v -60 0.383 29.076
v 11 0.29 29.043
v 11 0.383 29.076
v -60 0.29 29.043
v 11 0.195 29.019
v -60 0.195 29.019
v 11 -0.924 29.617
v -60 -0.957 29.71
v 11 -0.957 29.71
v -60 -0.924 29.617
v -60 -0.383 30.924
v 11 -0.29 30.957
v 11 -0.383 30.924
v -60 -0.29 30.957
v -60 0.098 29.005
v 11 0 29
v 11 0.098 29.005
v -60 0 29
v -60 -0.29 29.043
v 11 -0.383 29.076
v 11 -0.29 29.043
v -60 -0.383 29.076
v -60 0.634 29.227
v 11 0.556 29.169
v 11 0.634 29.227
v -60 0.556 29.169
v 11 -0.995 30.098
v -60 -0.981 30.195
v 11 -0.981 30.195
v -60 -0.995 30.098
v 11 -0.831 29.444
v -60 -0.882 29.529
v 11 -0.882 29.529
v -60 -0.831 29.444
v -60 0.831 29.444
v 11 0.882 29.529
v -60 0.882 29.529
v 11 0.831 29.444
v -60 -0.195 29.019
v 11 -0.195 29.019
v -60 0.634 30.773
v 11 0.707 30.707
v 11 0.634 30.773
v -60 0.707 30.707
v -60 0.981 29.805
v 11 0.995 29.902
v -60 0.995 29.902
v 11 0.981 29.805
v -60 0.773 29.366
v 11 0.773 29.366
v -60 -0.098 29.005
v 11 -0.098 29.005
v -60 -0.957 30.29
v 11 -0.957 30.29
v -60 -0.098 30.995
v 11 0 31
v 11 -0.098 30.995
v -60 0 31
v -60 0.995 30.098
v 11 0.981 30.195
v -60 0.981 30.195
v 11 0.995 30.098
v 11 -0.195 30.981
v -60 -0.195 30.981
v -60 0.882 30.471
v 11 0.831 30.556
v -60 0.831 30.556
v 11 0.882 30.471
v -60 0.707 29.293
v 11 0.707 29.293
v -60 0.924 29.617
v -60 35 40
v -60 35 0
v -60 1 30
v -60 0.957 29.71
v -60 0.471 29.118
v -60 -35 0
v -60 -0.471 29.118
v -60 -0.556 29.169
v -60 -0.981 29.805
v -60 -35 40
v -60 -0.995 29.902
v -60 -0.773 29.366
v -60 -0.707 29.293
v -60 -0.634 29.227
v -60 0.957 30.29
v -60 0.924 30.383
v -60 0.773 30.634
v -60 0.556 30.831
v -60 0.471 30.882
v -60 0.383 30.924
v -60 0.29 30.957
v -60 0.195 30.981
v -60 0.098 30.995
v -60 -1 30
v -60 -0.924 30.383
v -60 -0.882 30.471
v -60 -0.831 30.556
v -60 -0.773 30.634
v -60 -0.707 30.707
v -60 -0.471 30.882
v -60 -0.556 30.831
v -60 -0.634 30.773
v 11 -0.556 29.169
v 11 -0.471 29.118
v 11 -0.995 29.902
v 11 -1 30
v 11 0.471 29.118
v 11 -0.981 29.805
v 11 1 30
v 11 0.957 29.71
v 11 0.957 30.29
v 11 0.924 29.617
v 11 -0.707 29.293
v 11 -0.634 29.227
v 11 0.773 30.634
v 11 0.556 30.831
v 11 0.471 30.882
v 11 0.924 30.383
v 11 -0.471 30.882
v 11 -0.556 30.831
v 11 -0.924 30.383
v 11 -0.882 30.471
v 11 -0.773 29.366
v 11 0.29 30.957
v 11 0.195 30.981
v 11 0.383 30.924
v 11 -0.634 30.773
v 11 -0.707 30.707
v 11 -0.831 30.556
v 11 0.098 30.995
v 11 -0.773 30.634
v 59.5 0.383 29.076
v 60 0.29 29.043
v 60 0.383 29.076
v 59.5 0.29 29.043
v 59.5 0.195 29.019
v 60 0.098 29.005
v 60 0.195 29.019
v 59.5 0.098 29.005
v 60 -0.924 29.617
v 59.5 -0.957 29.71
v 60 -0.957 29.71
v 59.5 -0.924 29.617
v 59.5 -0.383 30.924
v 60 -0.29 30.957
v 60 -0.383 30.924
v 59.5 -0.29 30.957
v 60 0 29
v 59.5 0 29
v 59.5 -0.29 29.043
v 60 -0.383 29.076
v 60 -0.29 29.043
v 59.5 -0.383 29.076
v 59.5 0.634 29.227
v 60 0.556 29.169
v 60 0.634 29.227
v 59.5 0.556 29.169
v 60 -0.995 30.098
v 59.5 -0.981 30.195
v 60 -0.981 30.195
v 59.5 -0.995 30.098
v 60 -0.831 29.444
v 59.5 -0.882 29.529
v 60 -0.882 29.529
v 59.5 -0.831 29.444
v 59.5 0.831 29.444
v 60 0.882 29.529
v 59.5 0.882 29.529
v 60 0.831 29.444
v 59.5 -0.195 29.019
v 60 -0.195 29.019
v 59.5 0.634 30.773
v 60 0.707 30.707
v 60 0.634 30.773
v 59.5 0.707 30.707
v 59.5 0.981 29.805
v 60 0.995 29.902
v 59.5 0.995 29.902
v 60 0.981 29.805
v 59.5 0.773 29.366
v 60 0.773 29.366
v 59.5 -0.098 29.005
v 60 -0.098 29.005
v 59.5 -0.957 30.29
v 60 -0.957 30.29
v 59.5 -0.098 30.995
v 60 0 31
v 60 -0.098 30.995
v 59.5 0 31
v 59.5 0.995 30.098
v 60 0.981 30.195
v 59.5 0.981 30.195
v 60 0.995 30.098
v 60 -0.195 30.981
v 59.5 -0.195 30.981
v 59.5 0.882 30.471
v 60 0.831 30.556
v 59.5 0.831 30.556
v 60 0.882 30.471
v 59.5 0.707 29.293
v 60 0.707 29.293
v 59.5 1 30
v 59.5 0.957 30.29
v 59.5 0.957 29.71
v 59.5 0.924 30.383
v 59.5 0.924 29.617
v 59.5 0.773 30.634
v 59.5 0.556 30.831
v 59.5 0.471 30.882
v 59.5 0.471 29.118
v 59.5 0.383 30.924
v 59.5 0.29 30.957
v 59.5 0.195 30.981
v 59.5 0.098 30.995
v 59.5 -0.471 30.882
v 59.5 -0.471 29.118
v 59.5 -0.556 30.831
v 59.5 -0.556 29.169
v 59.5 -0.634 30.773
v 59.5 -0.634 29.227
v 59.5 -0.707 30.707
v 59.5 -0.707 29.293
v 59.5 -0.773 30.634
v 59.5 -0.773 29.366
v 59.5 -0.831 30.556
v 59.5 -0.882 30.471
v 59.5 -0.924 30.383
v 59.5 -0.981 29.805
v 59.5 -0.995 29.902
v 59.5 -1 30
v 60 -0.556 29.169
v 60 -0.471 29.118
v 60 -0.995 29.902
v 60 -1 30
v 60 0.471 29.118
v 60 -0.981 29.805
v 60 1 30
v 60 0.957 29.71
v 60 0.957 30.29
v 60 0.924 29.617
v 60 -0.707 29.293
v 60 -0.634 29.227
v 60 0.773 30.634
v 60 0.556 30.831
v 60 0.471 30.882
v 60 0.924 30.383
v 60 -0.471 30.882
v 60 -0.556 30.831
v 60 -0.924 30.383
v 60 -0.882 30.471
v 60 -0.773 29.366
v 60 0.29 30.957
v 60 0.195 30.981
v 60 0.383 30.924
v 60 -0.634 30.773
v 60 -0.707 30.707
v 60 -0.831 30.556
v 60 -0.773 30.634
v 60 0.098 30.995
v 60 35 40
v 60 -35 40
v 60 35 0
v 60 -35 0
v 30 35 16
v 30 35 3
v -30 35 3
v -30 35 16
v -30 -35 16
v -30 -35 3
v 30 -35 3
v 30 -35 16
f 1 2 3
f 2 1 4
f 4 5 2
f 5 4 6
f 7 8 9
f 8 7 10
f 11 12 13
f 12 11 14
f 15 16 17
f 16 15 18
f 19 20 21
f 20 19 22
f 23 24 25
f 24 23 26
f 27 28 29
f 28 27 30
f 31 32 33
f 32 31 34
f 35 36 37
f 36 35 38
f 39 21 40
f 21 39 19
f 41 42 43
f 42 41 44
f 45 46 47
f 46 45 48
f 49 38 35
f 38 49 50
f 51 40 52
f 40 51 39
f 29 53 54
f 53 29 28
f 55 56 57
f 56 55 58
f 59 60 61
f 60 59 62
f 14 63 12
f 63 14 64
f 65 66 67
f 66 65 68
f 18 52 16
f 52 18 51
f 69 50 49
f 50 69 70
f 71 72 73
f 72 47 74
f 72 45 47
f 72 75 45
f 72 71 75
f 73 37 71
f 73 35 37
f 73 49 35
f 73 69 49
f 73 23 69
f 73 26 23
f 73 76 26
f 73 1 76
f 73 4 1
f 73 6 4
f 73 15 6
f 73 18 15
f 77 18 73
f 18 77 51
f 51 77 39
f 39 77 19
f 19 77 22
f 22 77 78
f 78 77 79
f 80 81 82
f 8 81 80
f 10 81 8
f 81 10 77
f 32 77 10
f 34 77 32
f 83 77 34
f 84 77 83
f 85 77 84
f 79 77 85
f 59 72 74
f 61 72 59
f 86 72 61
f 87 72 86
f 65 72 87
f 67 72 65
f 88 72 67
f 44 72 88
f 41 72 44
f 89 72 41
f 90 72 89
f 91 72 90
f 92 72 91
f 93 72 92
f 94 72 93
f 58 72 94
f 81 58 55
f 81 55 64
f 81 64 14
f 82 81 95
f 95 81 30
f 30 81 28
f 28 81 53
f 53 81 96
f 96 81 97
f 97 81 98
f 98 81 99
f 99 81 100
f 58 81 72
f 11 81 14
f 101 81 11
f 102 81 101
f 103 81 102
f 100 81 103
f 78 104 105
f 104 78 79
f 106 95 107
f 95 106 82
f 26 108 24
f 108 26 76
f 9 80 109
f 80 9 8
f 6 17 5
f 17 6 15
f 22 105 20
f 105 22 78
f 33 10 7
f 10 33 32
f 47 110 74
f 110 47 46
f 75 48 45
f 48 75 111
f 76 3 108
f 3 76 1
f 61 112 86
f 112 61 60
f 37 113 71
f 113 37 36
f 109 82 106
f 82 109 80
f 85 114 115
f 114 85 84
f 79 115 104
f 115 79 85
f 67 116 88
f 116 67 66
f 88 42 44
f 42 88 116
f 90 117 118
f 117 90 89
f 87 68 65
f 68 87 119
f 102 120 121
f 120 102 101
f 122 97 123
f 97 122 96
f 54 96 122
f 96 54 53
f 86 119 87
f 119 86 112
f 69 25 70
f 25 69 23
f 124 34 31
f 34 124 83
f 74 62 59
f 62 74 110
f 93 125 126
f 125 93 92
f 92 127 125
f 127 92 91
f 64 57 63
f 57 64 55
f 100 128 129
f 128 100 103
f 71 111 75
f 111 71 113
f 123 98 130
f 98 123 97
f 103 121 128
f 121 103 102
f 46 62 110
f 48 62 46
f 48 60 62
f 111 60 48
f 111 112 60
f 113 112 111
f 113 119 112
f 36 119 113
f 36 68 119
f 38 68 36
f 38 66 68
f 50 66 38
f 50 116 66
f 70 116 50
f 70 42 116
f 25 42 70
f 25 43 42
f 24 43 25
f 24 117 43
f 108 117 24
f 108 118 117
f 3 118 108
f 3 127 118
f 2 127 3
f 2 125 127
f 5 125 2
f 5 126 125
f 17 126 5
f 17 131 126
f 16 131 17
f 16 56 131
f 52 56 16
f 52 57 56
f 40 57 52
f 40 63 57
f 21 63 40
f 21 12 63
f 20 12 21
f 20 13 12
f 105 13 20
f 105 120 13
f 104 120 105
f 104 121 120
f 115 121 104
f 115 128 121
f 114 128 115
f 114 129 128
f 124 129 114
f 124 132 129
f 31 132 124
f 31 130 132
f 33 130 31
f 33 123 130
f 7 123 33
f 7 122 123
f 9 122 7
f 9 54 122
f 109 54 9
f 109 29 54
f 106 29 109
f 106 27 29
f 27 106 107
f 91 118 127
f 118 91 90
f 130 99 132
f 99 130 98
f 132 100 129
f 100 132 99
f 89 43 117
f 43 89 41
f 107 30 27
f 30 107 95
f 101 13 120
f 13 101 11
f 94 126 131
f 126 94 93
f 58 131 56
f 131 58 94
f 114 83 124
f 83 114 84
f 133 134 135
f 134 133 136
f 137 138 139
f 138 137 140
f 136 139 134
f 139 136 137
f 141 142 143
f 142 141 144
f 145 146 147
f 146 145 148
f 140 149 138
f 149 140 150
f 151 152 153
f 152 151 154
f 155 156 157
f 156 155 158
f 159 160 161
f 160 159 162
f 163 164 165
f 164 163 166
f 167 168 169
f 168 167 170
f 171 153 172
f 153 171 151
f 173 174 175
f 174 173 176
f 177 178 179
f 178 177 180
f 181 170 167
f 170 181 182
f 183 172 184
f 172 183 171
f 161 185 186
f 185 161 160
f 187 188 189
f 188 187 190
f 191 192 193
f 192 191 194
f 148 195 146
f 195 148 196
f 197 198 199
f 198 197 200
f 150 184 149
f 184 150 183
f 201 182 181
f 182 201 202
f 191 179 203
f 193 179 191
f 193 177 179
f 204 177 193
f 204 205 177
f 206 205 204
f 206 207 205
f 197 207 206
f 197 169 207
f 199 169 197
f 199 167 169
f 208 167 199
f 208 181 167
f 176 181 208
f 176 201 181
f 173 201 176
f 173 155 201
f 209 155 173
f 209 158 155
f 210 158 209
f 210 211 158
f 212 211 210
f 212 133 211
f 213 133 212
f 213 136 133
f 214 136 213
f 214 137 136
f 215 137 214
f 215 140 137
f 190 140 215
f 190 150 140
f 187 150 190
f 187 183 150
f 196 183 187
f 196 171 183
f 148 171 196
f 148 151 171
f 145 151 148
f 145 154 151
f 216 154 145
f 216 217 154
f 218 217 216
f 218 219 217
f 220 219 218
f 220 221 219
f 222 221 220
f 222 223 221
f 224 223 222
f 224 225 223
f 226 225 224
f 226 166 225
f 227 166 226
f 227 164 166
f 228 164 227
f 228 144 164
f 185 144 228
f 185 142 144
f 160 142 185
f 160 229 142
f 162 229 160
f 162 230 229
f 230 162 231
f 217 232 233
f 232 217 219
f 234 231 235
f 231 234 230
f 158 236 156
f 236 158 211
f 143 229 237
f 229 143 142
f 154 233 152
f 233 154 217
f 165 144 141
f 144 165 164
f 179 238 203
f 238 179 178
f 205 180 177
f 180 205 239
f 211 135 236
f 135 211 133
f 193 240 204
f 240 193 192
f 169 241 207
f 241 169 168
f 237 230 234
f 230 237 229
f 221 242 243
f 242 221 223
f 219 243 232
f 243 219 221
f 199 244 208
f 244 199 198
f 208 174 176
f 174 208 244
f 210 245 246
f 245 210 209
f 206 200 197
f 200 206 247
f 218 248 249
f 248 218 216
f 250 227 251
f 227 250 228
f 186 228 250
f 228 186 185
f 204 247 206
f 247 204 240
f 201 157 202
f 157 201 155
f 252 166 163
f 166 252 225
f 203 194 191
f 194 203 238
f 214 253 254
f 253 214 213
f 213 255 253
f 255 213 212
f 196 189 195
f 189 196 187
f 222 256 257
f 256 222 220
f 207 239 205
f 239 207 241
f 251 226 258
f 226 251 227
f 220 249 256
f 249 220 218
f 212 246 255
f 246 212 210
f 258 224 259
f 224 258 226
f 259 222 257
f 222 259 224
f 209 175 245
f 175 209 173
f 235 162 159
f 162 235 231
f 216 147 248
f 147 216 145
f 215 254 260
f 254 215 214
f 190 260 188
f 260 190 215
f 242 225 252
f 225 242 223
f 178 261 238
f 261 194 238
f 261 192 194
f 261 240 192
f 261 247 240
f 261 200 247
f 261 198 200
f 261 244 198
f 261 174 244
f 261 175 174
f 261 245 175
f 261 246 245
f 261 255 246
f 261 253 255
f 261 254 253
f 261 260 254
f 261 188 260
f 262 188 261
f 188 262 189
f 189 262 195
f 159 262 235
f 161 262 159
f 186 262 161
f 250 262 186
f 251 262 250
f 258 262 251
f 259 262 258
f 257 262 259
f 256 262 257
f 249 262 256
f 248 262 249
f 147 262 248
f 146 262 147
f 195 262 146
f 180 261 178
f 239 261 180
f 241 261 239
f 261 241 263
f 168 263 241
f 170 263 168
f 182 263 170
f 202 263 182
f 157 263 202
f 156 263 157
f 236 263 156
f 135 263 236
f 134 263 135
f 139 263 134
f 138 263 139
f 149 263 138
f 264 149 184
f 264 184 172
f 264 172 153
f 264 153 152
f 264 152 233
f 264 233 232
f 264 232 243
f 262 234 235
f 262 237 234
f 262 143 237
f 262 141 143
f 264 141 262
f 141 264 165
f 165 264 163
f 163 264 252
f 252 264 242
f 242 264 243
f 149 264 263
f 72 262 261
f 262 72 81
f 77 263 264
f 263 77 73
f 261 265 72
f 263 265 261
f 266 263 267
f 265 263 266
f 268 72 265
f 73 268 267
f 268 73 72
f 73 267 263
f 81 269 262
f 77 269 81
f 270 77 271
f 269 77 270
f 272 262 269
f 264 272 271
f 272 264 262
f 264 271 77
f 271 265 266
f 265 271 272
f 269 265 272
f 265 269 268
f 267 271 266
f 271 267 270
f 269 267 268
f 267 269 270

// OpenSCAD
// Mini horizontal gel-electrophoresis buffer tank
// Print orientation: base on XY plane, open top, builds up +Z

$fn = 64;

// ---- Tank dimensions ----
outer_x = 120;   // outer length in X
outer_y = 70;    // outer width in Y
height  = 40;    // overall height in Z
wall    = 3;     // wall thickness
floor   = 3;     // floor thickness

// ---- Platform dimensions ----
plat_len   = 60;  // platform length in X (centred)
plat_top_z = 13;  // platform top height above inner floor

// ---- Electrode holes ----
hole_d = 2;       // hole diameter
hole_y = 0;       // hole Y position
hole_z = 30;      // hole Z position

// ---- Derived ----
inner_h = height - floor;              // inner floor to open top
cut_ext = 0.5;                         // overshoot for clean cuts

difference() {
    // Tank body
    translate([-outer_x/2, -outer_y/2, 0])
        cube([outer_x, outer_y, height]);

    // Raised platform (full inner width, centred in X)
    translate([-plat_len/2, -outer_y/2, floor])
        cube([plat_len, outer_y, plat_top_z]);

    // Electrode holes through end walls along X
    for (sx = [-1, 1])
        translate([sx > 0 ? outer_x/2 - cut_ext : -outer_x/2, hole_y, hole_z])
            rotate([0, 90, 0])
                cylinder(d = hole_d, h = outer_y + 2*cut_ext);
}
